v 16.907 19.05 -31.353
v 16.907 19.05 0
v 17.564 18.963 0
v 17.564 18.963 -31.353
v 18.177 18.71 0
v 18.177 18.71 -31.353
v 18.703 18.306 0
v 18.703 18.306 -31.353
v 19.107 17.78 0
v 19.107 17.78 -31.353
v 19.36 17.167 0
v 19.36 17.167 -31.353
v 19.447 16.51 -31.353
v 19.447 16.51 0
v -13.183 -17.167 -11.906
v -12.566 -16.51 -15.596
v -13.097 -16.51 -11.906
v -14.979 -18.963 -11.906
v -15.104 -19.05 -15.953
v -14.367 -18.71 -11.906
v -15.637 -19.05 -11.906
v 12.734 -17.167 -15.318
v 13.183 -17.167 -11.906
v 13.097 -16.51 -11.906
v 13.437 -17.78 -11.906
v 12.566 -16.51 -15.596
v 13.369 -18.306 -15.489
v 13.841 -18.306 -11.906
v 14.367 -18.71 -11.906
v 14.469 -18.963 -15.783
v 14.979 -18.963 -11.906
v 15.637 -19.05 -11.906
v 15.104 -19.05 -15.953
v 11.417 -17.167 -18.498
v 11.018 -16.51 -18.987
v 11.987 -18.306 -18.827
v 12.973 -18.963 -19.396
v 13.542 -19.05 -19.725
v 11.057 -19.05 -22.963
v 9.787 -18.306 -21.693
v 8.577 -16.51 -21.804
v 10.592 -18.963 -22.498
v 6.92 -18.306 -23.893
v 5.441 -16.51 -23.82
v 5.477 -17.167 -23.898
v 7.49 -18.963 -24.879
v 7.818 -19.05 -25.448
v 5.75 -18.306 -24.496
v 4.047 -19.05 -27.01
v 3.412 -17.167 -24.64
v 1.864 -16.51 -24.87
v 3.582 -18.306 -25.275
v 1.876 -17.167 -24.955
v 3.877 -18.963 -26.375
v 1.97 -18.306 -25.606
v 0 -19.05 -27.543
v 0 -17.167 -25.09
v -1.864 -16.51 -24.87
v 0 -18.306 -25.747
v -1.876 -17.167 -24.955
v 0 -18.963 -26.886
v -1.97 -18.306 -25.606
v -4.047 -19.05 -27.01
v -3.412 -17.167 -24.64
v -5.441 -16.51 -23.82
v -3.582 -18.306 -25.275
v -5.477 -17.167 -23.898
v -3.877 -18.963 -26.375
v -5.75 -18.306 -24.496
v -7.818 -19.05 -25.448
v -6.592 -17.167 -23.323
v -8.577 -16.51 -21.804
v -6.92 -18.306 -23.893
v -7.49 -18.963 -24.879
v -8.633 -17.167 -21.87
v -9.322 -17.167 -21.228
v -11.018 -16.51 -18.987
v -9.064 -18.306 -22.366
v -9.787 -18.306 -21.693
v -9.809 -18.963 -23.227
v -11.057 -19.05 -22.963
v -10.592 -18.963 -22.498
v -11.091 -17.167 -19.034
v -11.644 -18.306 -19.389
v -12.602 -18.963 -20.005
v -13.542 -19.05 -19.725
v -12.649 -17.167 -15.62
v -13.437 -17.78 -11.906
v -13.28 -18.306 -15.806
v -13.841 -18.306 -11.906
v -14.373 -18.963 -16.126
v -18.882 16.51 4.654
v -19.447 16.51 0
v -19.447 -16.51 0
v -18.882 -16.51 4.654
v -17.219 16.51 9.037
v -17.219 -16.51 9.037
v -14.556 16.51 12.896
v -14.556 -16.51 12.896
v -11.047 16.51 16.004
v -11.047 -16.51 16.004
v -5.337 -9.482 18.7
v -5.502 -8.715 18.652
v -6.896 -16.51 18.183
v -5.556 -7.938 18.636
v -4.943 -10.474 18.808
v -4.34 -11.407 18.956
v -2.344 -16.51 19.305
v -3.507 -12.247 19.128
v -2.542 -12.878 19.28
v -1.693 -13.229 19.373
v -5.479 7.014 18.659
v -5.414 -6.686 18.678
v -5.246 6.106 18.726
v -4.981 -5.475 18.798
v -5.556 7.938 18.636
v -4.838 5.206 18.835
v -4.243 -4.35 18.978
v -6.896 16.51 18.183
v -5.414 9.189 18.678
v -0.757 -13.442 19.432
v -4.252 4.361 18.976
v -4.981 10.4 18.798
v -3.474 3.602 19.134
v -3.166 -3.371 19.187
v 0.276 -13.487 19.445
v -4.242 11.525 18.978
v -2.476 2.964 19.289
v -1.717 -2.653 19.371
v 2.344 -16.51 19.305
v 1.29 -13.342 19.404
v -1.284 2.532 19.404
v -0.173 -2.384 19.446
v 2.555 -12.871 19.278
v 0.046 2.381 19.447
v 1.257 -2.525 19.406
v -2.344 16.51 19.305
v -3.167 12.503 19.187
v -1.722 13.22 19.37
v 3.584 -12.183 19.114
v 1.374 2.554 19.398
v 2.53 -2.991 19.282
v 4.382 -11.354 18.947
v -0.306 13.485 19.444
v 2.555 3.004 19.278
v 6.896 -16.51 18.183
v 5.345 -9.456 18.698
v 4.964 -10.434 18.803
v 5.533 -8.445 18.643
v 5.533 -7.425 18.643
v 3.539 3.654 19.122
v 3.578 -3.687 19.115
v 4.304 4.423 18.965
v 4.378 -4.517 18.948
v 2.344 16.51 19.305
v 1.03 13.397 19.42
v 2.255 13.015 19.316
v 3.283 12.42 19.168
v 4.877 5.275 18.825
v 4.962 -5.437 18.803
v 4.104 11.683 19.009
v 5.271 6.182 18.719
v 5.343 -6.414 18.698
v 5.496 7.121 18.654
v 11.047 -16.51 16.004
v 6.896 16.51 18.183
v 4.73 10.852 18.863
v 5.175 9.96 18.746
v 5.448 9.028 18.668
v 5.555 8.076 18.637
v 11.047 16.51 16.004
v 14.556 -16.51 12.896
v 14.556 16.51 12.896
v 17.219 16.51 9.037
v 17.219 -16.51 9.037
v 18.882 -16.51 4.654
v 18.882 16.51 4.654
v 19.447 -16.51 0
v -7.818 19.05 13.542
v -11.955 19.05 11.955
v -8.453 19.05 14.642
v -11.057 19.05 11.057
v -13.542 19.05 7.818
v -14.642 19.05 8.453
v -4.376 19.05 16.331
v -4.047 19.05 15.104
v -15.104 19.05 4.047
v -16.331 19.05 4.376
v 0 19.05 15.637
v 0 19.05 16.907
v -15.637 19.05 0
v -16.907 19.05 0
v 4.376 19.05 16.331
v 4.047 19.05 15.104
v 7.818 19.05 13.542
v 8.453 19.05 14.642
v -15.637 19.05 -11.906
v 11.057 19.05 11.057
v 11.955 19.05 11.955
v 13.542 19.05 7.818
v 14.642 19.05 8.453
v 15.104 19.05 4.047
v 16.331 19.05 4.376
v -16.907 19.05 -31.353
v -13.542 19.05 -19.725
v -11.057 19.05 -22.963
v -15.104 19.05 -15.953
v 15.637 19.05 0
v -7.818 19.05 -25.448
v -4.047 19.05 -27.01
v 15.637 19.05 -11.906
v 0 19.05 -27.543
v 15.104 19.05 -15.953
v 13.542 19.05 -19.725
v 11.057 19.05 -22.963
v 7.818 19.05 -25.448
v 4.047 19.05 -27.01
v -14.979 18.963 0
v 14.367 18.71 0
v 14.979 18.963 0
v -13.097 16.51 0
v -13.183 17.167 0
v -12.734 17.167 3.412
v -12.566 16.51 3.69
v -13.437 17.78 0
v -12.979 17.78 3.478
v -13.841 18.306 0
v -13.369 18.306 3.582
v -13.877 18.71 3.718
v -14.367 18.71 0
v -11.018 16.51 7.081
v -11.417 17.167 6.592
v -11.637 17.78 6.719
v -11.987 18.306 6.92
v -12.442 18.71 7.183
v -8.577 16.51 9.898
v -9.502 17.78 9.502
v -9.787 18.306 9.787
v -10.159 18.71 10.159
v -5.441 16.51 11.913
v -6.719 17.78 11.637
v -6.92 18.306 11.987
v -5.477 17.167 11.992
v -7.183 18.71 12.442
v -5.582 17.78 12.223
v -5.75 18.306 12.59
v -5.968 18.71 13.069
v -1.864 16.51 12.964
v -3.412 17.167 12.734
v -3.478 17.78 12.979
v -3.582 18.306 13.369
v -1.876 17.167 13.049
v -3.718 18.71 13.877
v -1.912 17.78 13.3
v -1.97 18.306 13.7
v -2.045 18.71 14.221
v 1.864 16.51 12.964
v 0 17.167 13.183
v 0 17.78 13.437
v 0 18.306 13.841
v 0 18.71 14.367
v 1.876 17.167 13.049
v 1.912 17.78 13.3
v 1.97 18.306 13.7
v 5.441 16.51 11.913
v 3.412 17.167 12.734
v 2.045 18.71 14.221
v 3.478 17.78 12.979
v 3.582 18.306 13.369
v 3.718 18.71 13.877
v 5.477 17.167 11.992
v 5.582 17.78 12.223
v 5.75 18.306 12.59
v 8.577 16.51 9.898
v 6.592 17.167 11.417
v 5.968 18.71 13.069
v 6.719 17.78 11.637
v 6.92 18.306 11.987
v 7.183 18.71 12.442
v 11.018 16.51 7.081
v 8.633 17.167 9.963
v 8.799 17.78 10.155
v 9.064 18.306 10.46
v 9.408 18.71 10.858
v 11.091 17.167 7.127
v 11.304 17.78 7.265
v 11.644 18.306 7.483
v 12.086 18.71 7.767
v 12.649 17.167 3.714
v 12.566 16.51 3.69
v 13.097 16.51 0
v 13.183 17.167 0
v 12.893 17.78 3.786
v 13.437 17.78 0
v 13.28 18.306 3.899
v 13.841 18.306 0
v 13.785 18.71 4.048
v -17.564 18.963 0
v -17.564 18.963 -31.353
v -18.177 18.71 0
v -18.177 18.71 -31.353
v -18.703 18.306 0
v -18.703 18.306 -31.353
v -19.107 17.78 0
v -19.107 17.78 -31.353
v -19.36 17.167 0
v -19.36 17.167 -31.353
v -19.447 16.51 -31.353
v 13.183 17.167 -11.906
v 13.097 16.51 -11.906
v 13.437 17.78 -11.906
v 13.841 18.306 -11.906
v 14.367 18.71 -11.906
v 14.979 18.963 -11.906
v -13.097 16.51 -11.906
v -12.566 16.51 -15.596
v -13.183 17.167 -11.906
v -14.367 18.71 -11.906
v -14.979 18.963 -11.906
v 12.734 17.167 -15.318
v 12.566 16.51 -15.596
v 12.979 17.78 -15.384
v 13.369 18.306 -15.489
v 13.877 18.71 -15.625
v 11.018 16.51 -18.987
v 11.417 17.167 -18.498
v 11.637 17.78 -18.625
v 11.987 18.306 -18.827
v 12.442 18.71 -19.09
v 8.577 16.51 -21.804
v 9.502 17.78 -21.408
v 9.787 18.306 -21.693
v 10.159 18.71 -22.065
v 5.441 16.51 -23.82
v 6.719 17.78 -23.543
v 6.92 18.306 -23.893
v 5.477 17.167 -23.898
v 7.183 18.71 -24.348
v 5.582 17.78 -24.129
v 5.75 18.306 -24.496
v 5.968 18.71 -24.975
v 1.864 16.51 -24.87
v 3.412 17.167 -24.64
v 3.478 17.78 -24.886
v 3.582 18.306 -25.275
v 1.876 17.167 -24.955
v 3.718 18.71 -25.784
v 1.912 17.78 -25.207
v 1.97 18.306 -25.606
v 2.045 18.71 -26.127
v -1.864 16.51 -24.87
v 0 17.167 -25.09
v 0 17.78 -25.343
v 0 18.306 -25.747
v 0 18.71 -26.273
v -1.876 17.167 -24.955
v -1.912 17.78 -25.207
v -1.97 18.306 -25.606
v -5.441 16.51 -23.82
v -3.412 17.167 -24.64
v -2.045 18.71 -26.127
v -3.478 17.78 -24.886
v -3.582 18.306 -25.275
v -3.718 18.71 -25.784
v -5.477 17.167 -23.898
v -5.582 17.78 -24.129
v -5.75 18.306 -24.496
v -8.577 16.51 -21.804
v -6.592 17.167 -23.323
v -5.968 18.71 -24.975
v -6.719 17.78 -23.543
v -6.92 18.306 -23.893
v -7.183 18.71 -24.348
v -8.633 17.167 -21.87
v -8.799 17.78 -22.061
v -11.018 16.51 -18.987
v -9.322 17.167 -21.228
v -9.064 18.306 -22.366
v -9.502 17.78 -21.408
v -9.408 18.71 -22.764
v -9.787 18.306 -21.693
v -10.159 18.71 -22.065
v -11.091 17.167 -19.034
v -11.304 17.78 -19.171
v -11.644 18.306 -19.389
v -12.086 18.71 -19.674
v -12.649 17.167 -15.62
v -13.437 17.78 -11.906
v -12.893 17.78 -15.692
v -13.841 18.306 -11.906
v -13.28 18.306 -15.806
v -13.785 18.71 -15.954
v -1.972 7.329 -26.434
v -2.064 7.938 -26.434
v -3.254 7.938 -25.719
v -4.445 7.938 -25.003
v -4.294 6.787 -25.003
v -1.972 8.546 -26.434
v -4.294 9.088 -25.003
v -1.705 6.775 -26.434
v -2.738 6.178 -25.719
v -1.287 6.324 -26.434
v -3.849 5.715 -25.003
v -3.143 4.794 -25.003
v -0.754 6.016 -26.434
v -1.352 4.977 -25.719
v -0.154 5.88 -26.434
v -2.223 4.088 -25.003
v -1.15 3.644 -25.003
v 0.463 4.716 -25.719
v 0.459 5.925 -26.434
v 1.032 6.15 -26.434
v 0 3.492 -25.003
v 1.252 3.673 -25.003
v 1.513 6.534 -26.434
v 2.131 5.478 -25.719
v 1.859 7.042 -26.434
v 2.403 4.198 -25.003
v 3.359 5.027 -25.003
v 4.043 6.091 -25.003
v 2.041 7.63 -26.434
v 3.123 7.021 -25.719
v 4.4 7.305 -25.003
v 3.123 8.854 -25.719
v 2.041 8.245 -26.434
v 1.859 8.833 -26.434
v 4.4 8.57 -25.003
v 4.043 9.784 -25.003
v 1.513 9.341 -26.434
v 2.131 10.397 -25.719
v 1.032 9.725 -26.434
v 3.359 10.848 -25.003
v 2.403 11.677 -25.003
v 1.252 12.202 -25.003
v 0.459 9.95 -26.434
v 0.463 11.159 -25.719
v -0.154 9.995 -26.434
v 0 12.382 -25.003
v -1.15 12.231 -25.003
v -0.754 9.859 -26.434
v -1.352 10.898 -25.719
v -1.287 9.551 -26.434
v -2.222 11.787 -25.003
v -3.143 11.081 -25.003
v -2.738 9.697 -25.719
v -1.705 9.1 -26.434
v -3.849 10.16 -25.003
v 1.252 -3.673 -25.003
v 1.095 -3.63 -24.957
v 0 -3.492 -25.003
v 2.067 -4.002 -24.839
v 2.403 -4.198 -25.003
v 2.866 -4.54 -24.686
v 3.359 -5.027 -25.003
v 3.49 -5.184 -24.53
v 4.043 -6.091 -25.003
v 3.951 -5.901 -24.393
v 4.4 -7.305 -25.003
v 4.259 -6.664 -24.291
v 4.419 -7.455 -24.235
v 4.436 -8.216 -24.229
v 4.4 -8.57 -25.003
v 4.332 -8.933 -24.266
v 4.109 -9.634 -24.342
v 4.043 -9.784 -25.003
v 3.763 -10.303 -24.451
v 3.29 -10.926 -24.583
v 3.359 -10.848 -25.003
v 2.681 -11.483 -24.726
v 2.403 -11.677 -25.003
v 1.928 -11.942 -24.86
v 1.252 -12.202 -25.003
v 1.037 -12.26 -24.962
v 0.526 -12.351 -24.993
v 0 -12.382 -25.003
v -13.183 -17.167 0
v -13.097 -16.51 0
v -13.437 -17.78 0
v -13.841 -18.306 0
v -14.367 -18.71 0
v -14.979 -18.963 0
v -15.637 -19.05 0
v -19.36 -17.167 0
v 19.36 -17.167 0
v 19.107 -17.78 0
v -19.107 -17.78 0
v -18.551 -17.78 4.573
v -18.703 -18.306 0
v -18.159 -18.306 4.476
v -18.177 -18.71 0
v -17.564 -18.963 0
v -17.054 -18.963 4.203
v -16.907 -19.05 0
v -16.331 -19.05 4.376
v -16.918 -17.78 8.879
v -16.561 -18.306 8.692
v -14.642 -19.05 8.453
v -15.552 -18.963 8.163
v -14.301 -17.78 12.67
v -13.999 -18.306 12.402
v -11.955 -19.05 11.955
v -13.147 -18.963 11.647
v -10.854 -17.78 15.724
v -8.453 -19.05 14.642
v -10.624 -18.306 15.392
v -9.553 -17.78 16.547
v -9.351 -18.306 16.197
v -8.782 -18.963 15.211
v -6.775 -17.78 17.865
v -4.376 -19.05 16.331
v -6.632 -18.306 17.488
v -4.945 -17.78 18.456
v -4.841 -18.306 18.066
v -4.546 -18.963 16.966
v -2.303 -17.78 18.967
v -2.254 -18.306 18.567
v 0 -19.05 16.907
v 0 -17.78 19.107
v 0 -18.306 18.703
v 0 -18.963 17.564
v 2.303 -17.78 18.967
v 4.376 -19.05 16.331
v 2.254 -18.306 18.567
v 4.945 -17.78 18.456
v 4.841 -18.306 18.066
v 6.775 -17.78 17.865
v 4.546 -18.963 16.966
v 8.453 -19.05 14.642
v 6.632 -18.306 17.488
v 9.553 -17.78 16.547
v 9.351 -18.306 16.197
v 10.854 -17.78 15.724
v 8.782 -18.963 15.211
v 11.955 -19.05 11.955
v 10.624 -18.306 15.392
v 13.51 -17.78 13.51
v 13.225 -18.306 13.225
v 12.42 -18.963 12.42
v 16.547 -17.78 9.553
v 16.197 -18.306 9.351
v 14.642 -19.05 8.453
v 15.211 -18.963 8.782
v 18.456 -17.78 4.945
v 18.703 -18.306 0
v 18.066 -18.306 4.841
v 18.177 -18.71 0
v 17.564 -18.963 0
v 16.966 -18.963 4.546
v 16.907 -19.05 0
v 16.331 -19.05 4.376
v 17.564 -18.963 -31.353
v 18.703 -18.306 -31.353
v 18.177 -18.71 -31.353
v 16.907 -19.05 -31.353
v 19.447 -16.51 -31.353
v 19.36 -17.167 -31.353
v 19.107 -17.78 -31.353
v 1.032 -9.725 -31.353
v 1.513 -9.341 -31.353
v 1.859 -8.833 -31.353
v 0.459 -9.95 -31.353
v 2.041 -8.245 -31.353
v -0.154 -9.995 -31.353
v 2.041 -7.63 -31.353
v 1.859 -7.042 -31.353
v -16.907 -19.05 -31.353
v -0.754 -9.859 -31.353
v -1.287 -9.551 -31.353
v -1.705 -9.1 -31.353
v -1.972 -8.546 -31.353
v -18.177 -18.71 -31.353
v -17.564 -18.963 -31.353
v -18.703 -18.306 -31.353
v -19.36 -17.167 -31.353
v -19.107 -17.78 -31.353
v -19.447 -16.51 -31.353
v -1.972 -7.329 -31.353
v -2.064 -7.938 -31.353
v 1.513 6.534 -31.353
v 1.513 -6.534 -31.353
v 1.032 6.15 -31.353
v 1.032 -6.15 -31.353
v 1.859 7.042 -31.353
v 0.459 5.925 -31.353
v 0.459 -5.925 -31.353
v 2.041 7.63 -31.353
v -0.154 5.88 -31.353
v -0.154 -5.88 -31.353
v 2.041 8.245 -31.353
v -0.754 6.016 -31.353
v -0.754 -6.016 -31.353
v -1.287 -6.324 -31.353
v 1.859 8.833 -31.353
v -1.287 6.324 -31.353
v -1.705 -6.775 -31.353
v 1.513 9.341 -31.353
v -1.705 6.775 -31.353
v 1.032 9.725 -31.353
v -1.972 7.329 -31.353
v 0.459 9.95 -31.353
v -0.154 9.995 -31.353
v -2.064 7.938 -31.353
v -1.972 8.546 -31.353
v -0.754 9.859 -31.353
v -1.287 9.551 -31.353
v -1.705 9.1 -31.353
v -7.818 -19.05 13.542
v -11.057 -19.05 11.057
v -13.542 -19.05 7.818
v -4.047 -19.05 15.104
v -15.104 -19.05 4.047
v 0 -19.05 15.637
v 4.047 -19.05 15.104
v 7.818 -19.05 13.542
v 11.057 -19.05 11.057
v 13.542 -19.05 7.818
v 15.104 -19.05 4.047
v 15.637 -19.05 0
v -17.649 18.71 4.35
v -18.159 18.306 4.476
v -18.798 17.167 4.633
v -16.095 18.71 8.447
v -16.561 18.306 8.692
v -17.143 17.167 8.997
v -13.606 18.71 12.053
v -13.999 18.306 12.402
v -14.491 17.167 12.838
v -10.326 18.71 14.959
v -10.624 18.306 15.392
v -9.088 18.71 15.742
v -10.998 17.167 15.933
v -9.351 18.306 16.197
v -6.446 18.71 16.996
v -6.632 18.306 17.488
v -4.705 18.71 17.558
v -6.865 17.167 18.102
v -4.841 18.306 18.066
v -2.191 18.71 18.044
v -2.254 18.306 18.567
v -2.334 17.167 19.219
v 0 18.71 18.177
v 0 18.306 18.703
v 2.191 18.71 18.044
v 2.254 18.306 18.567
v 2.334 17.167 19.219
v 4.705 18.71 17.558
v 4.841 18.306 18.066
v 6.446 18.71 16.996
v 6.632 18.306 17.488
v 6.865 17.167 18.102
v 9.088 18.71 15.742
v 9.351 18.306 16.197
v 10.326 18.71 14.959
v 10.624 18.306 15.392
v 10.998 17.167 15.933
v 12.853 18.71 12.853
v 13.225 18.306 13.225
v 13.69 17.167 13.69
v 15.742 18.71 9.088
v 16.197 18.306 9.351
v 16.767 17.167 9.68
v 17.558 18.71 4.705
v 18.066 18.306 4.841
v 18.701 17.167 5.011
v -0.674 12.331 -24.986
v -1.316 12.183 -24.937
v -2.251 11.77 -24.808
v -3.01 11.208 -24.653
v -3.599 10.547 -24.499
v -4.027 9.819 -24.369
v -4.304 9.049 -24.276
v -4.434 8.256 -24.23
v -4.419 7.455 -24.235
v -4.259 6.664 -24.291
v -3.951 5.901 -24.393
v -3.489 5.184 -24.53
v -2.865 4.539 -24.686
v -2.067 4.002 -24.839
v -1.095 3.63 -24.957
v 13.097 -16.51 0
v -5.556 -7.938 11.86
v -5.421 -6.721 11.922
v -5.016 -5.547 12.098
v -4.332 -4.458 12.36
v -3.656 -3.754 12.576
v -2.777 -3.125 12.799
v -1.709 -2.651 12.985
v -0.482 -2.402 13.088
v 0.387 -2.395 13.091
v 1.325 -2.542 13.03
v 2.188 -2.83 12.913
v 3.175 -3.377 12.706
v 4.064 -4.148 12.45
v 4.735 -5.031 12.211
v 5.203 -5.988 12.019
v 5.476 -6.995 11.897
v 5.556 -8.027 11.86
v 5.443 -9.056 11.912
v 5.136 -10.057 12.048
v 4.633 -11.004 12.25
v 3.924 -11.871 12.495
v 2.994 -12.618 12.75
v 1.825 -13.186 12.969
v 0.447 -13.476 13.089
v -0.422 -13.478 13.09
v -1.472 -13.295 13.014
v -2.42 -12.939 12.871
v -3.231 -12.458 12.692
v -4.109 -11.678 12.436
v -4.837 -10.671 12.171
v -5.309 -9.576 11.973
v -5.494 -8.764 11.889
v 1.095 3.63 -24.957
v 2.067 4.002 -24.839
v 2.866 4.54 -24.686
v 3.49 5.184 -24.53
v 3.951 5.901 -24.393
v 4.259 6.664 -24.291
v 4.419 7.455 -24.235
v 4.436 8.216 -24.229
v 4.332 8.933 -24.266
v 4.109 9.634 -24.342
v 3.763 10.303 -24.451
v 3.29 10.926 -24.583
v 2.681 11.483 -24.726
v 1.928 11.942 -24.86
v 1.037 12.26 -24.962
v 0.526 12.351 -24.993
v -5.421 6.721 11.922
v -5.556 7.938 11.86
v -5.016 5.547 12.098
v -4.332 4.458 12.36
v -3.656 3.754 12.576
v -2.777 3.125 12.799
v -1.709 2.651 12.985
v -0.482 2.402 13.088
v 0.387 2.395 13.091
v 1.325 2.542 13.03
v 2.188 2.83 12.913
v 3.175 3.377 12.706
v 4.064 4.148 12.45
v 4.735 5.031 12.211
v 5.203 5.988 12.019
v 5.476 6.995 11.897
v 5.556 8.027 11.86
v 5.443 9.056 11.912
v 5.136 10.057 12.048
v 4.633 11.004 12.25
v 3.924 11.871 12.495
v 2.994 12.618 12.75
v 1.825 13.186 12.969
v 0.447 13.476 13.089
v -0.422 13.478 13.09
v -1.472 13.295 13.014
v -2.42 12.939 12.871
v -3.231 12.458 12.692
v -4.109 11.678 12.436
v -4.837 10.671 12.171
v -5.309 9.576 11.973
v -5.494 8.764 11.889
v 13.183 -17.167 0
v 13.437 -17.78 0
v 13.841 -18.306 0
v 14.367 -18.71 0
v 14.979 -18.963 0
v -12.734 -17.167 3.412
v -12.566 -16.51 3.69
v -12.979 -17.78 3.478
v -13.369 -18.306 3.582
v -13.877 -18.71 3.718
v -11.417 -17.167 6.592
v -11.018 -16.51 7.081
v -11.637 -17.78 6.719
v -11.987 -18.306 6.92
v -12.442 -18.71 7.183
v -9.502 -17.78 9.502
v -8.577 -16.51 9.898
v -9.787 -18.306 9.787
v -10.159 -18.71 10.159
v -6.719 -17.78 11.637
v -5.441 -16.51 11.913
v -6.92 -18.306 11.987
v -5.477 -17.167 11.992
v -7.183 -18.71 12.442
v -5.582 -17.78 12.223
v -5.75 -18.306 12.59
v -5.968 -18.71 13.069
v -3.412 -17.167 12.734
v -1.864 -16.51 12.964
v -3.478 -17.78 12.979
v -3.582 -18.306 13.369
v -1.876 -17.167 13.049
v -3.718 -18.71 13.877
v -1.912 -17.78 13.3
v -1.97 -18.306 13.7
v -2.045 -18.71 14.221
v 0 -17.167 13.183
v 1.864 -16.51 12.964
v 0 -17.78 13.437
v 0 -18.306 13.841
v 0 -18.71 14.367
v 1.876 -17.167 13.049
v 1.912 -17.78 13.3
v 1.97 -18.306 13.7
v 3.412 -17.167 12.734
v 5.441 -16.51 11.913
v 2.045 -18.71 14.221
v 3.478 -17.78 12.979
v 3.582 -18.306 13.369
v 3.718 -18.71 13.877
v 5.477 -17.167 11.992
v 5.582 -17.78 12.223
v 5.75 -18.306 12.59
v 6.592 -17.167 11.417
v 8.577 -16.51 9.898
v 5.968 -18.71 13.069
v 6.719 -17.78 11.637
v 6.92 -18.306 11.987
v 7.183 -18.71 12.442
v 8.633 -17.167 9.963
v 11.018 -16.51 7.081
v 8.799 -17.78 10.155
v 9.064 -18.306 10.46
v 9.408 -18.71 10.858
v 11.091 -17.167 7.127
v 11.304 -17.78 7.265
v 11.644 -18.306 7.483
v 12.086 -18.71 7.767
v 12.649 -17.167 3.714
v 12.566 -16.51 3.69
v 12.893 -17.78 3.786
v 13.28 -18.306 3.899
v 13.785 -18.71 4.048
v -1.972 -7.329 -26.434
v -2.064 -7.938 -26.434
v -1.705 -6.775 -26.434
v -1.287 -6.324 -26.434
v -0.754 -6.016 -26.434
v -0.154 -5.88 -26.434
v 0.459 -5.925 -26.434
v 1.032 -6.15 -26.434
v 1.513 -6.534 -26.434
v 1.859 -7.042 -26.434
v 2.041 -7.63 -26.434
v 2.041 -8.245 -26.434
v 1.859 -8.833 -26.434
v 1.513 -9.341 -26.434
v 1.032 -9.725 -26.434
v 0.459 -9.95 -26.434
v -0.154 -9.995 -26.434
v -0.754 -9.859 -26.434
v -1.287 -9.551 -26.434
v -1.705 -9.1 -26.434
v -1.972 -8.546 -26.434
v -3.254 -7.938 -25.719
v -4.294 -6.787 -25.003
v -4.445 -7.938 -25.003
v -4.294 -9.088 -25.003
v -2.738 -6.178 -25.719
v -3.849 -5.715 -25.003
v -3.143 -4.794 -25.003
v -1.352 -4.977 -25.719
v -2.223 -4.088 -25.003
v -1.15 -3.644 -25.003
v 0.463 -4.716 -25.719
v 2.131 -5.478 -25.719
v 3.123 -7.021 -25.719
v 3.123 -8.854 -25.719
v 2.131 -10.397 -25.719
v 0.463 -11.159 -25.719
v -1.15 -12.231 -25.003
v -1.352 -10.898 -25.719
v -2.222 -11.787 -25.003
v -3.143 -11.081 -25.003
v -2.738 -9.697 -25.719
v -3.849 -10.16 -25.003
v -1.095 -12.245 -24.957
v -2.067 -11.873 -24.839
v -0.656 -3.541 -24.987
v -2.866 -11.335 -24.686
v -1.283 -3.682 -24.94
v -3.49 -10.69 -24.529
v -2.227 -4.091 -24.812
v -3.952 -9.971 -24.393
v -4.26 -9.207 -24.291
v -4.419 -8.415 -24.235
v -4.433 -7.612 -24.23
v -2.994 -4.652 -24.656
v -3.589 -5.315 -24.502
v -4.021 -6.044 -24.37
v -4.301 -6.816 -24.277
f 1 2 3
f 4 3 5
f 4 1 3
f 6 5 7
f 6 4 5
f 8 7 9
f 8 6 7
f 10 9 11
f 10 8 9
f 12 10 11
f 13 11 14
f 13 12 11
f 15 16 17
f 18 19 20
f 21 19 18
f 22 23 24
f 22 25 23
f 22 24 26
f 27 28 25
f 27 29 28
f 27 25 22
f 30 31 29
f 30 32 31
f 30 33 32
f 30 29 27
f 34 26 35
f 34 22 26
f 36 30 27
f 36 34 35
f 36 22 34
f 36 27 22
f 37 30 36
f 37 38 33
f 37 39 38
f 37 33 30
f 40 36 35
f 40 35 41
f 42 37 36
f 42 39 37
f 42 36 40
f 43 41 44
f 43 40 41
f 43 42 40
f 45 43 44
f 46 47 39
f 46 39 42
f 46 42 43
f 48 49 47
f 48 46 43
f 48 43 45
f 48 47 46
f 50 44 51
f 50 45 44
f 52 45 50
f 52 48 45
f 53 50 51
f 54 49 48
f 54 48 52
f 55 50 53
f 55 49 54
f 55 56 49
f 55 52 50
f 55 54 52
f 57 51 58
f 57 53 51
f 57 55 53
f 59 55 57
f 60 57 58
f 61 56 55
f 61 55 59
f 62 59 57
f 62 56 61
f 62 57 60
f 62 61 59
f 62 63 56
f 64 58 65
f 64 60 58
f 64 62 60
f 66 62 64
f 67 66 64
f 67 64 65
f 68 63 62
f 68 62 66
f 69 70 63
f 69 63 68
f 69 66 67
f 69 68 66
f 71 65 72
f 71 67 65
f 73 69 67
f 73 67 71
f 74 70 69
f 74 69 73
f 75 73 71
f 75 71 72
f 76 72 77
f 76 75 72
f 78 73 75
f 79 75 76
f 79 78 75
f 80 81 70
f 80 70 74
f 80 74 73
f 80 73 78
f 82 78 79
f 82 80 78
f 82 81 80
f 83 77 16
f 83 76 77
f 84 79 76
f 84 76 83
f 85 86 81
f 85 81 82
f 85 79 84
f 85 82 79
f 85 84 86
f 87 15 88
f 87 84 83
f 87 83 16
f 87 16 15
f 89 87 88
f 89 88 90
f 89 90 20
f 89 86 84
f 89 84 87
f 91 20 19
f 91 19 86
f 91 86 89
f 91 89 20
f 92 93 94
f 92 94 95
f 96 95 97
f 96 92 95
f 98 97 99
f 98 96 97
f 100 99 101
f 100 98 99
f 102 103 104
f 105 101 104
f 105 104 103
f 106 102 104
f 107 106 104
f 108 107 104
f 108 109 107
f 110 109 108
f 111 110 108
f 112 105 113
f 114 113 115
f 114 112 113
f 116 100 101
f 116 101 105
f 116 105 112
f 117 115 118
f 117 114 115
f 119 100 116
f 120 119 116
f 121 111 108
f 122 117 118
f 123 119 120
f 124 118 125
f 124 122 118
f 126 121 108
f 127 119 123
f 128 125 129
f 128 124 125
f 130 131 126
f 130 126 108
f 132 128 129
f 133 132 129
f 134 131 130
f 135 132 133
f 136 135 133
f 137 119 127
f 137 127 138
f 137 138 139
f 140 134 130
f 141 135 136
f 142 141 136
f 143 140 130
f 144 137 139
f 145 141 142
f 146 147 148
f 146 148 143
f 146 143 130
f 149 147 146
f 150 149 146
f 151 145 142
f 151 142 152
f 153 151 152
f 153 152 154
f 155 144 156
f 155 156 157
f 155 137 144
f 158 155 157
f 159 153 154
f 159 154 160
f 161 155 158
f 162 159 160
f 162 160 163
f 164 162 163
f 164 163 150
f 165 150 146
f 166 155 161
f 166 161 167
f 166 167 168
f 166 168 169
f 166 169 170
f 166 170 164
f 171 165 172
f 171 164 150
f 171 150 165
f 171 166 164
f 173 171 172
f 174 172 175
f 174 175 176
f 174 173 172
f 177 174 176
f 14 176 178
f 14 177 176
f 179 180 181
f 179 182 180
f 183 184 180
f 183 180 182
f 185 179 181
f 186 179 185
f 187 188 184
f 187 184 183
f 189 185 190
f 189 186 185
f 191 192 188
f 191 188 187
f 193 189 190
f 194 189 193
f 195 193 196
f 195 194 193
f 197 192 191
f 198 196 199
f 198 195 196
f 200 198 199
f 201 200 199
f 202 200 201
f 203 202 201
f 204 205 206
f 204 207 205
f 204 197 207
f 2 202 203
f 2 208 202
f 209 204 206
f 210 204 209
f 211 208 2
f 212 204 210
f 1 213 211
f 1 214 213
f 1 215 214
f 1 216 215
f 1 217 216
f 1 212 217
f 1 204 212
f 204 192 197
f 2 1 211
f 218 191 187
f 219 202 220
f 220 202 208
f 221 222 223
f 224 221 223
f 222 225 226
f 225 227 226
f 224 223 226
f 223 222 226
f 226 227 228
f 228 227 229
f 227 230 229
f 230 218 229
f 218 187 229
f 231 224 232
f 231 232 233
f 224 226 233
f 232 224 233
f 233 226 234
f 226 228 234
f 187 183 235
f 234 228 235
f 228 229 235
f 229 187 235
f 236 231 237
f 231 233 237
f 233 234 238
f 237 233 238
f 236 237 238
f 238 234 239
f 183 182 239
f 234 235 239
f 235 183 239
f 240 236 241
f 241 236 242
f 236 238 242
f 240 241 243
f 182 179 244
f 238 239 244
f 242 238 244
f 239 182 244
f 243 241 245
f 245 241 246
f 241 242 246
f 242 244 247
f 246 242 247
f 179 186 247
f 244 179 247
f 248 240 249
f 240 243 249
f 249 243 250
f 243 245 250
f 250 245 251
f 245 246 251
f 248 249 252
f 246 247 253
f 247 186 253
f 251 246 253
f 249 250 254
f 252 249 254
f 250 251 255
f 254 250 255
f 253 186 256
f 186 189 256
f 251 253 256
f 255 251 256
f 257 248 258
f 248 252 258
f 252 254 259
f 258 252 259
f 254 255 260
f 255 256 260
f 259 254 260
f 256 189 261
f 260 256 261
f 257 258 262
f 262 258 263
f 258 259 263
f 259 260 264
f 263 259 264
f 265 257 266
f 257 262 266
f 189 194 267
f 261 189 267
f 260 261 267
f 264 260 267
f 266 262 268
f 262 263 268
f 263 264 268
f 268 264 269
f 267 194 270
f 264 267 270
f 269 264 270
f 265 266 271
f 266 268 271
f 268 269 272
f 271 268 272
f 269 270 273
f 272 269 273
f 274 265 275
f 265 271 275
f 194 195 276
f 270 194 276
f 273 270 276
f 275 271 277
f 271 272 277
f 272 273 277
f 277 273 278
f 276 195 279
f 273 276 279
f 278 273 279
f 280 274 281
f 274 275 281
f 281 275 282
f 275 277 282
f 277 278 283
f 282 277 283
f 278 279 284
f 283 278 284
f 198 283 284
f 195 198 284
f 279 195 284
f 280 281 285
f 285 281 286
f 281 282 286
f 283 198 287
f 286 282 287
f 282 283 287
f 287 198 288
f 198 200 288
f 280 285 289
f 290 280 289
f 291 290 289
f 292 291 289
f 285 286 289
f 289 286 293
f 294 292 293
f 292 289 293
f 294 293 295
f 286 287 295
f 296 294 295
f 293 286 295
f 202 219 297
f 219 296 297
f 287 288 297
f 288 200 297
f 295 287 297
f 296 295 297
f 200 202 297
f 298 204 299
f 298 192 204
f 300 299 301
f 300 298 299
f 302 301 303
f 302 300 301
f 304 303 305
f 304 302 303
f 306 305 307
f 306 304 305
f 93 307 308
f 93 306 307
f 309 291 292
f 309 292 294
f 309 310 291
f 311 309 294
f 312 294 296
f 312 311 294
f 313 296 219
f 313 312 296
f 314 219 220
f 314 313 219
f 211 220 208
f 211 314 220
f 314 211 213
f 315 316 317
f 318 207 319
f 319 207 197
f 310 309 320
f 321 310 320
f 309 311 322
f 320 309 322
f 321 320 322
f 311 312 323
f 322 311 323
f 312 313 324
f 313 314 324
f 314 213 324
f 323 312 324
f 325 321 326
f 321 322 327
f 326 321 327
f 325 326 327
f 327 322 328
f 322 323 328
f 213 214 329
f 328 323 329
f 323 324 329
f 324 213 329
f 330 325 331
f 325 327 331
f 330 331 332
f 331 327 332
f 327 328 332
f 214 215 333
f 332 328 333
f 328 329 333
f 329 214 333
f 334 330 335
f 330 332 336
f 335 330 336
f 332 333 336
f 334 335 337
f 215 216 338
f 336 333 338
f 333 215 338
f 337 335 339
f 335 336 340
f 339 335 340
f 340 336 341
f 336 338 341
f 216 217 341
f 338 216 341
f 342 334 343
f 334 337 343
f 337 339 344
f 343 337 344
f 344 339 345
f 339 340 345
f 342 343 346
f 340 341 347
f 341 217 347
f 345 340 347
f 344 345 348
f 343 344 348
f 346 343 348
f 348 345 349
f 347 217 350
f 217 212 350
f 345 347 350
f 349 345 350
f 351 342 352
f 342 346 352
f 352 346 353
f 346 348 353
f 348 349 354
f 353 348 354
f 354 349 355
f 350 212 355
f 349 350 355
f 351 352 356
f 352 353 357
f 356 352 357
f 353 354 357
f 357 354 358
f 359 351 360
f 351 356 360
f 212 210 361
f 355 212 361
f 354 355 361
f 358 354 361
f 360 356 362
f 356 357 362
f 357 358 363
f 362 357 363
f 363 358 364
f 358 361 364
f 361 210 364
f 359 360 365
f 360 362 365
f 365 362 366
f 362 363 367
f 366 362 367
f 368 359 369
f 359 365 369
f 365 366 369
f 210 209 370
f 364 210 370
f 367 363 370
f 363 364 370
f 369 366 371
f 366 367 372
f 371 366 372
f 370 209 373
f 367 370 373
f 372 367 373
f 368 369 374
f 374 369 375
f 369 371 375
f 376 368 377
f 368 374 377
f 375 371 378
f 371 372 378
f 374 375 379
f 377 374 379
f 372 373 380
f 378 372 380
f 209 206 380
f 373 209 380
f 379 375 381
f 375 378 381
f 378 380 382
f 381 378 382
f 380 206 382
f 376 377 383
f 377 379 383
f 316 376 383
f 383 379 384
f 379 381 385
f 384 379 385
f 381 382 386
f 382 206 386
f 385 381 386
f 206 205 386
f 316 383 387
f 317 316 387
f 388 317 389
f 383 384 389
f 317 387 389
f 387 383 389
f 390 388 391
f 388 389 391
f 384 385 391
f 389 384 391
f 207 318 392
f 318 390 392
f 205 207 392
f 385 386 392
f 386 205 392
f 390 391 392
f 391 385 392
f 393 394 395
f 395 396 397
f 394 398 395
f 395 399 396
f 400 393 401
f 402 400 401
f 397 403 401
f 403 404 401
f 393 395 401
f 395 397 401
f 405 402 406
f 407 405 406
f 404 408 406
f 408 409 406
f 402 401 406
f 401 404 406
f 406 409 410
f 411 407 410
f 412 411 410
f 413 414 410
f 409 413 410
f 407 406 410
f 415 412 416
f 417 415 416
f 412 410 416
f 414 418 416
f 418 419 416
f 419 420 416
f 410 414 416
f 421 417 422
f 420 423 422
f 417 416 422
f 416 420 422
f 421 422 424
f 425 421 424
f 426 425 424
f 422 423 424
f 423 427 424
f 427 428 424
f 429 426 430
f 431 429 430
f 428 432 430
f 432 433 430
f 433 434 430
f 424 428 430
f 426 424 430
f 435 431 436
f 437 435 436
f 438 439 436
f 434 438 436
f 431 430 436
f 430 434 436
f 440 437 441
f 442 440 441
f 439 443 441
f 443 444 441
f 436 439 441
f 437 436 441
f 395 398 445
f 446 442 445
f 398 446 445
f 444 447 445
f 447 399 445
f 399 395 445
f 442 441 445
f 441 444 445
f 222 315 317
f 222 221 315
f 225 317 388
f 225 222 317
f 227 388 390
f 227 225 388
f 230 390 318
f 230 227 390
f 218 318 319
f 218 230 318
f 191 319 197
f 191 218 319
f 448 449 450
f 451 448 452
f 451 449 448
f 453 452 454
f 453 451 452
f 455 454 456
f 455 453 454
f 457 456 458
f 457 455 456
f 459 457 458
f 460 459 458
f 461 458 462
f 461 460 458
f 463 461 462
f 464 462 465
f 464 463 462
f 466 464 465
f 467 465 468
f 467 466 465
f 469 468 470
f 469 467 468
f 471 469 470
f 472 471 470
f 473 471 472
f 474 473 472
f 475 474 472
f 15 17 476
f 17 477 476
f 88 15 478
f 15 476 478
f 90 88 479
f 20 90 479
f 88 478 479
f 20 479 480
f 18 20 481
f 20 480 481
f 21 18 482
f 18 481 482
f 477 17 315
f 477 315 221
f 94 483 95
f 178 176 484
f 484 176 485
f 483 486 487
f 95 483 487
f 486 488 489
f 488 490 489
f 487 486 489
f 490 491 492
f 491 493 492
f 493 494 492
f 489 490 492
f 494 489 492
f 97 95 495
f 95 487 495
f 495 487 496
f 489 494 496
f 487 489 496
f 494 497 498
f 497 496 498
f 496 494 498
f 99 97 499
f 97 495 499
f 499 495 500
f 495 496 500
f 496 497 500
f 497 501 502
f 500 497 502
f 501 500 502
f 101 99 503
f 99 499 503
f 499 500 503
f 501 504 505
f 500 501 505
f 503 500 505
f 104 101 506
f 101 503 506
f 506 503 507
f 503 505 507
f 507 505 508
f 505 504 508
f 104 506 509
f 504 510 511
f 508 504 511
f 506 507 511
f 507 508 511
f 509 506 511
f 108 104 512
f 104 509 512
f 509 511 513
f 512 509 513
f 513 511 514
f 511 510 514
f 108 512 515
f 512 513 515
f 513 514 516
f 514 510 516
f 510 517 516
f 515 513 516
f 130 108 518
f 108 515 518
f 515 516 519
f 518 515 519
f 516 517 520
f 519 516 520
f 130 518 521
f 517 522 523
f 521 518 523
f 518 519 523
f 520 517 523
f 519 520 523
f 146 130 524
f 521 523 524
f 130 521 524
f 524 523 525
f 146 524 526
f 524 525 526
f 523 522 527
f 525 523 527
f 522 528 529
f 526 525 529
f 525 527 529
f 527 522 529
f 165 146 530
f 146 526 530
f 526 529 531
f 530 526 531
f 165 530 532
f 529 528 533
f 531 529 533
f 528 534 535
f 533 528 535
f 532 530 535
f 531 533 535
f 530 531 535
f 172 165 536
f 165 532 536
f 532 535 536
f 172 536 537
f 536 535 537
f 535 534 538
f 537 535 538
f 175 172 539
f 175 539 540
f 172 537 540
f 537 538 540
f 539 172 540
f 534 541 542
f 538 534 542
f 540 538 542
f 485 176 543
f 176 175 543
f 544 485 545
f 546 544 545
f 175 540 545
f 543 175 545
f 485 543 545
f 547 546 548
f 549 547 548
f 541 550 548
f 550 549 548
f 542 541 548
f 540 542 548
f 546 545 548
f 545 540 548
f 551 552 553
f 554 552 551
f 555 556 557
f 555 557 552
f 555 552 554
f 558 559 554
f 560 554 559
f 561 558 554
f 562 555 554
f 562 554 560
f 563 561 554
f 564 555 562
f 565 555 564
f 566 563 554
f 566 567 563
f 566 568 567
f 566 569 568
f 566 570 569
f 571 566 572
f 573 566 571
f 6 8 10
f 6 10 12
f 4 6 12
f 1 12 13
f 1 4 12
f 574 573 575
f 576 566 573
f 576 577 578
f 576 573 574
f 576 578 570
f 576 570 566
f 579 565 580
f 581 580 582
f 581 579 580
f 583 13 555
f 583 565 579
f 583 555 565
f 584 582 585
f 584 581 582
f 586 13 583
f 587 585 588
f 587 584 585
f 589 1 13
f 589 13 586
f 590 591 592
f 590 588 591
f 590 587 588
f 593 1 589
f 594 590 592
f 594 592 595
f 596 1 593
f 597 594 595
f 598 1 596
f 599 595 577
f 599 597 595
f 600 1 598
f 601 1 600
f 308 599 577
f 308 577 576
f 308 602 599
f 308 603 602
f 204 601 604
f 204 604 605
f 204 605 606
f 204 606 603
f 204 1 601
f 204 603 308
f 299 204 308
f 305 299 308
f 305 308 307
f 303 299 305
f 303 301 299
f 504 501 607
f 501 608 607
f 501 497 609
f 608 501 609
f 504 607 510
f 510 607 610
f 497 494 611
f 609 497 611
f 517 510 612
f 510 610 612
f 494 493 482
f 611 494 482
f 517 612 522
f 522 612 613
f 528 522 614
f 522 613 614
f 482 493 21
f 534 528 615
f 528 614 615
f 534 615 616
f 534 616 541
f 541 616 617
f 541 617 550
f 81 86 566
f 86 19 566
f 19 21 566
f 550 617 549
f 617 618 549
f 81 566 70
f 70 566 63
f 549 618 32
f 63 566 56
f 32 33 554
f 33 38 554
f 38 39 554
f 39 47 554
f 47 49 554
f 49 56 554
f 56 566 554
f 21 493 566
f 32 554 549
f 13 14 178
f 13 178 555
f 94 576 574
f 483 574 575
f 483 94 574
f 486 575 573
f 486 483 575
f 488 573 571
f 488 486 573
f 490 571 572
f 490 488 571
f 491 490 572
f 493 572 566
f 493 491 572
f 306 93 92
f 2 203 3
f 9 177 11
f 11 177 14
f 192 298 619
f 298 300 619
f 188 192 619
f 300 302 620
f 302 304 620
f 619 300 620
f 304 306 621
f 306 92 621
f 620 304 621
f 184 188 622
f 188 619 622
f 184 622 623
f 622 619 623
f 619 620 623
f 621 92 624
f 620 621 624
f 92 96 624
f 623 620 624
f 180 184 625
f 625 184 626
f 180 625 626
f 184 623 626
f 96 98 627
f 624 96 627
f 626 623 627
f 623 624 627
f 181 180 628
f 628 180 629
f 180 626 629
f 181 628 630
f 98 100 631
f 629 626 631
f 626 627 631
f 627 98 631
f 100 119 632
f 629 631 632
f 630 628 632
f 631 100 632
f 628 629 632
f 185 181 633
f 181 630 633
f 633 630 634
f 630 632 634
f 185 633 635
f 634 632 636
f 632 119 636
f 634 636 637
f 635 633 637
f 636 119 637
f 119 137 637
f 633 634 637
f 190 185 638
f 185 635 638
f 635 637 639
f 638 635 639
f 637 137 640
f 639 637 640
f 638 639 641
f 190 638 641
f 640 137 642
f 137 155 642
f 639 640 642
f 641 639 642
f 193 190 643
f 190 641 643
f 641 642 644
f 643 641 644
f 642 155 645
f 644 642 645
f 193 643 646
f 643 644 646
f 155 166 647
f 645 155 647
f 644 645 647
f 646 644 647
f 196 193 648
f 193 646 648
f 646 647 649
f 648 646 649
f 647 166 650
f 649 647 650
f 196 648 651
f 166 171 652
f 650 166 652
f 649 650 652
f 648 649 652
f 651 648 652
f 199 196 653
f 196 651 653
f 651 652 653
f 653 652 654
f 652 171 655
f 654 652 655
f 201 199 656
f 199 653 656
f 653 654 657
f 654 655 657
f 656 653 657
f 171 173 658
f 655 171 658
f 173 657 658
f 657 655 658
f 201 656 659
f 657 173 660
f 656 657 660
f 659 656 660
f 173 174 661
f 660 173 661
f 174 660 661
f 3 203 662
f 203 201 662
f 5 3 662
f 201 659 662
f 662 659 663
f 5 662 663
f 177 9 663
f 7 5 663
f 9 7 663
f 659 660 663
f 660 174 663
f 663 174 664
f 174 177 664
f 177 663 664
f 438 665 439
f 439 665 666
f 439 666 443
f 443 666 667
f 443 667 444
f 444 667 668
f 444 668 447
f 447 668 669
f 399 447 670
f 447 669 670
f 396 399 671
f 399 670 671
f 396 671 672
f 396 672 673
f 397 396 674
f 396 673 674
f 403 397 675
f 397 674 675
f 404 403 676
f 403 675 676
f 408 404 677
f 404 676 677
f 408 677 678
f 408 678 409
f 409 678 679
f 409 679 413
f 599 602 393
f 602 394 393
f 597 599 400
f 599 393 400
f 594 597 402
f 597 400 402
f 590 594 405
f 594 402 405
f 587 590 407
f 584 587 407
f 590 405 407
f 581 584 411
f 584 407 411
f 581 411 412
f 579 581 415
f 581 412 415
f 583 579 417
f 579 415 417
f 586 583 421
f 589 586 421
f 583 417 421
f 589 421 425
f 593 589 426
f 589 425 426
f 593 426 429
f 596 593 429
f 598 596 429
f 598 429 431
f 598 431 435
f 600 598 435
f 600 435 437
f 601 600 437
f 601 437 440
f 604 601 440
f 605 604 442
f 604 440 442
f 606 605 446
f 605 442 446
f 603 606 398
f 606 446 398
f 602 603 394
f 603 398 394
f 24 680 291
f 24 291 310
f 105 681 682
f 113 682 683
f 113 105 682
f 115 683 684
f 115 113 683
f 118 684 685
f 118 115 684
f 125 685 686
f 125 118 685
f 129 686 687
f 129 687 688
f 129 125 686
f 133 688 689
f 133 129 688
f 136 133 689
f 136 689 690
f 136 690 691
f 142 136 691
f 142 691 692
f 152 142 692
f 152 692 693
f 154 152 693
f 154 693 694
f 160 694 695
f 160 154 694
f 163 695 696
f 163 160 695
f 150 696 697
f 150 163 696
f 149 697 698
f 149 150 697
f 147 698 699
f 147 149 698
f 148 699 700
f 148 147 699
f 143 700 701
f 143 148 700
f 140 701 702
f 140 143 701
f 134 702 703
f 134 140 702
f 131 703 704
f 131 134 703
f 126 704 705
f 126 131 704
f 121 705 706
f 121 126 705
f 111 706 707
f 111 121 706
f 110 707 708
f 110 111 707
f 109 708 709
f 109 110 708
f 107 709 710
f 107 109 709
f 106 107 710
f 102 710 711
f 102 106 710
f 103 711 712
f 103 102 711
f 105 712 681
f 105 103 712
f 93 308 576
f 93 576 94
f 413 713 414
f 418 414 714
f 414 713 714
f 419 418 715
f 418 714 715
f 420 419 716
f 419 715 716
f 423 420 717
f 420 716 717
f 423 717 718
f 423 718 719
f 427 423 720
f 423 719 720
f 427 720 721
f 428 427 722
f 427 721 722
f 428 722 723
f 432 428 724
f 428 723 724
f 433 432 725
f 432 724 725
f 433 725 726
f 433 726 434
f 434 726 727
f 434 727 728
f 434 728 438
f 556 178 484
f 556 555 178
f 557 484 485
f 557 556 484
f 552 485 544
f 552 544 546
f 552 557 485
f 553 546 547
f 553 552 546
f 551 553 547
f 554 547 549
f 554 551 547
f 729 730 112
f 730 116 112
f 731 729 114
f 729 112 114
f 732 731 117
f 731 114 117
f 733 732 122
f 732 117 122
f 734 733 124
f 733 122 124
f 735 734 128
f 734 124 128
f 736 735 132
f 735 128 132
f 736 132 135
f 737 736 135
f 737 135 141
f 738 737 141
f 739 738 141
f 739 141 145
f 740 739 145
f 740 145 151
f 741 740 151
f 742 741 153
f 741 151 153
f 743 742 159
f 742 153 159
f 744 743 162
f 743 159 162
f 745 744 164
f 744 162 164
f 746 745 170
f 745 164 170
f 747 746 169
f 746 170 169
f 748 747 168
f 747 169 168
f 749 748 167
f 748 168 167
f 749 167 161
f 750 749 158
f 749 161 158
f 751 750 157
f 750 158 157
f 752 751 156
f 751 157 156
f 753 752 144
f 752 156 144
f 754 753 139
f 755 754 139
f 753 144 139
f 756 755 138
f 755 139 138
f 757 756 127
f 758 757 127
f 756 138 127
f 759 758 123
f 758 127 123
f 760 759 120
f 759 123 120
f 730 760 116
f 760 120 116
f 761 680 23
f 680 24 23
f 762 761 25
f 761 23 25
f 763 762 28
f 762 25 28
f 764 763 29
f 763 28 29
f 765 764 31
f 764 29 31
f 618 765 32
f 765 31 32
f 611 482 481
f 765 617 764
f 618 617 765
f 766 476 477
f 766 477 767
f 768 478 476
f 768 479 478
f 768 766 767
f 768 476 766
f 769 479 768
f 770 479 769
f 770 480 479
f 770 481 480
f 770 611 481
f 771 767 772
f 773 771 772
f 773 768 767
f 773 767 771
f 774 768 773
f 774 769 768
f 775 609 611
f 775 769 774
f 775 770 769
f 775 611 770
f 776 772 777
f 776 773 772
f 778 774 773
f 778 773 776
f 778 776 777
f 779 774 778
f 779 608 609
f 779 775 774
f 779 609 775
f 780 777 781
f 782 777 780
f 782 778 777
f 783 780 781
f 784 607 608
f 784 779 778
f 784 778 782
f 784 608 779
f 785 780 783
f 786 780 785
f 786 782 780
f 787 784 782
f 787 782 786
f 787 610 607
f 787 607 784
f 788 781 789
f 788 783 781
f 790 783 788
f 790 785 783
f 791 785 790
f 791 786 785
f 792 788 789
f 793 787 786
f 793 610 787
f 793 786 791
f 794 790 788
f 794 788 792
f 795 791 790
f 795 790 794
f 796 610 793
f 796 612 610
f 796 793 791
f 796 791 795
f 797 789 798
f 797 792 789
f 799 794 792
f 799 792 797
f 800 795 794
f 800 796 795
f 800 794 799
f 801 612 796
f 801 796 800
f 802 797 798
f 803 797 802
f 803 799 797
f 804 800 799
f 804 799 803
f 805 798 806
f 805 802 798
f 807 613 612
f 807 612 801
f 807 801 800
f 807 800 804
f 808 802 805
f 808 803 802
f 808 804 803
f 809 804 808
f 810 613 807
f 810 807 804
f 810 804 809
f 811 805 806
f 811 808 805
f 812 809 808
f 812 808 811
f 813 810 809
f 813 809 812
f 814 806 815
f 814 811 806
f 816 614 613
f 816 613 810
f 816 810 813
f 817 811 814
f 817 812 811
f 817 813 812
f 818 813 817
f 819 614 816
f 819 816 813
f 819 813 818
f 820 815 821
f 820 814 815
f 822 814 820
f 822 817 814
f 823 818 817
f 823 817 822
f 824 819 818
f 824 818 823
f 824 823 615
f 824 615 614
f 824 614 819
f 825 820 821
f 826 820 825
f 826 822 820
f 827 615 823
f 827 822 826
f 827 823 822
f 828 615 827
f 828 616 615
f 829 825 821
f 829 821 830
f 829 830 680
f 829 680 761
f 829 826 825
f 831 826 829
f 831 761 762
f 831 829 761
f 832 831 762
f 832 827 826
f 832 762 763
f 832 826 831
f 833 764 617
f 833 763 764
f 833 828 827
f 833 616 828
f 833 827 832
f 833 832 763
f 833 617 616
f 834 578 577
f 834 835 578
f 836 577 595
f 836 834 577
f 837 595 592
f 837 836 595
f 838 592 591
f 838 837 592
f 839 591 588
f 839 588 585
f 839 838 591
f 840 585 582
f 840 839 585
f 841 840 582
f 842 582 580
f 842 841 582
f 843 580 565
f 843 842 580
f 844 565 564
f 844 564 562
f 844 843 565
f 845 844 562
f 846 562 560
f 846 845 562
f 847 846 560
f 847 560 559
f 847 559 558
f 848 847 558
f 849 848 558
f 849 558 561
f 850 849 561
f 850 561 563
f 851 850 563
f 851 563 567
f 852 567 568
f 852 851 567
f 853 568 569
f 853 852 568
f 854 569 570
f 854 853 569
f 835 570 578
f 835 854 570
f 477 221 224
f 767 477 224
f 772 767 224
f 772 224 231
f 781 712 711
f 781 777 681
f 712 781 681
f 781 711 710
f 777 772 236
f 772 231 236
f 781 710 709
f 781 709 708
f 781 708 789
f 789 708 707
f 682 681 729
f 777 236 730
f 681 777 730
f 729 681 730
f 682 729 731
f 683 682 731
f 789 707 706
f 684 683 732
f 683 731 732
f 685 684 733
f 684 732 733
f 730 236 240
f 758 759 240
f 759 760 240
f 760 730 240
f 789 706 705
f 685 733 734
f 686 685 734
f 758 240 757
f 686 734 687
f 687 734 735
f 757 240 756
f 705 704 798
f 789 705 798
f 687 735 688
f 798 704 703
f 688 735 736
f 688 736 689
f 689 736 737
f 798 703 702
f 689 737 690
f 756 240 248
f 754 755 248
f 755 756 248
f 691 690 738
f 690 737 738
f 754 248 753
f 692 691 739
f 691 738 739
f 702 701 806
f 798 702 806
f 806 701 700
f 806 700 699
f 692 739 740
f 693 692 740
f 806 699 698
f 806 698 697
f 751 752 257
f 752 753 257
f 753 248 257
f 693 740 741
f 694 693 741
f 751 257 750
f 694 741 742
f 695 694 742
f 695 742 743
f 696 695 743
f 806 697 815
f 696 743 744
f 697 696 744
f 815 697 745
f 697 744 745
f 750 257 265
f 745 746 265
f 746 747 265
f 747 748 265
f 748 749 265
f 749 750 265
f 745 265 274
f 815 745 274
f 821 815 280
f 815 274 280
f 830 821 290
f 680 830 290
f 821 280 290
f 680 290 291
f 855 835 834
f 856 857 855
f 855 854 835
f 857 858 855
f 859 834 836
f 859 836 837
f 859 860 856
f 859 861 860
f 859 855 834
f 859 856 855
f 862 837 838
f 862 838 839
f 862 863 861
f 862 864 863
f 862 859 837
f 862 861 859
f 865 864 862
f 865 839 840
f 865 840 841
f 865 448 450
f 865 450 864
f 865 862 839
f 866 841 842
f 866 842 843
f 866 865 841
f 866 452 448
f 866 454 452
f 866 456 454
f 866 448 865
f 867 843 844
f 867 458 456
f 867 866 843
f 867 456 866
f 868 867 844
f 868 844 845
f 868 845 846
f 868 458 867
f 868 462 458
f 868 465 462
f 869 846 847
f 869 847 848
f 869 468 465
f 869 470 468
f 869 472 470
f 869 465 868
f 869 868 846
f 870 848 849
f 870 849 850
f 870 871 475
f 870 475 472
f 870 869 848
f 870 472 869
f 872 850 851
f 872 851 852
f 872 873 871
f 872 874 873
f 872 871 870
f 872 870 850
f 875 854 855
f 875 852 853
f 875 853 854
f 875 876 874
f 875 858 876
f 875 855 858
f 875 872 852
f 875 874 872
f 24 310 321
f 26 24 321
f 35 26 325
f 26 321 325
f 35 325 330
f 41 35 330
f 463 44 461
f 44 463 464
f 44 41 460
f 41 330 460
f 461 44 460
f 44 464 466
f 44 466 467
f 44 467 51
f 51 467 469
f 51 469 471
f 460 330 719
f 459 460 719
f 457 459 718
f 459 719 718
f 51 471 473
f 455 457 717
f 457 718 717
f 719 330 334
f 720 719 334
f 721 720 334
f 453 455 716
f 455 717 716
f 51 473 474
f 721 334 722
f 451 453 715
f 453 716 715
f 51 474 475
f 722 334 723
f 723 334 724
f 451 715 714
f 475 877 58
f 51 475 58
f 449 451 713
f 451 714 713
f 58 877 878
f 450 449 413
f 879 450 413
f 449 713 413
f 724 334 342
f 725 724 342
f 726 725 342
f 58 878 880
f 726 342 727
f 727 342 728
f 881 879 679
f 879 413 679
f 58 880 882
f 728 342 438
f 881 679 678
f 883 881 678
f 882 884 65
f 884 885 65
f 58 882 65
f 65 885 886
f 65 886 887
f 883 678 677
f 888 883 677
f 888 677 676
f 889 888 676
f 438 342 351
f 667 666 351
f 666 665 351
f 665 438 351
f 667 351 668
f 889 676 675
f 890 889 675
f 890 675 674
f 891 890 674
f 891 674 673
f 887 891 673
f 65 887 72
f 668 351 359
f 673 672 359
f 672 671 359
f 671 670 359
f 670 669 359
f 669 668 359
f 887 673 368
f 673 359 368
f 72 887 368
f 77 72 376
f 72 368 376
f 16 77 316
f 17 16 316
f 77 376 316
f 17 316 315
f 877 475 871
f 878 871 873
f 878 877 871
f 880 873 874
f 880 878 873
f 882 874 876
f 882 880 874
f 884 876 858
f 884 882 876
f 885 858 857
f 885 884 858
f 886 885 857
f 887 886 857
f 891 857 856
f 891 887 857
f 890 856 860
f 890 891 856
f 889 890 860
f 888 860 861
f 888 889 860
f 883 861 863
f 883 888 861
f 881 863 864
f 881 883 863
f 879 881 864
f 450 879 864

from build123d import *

# Parameters (mm, degrees)
BOSS_EXTRUDE1_DEPTH = 19.05
FILLET1_R           = 2.54


with BuildPart() as part:
    # Sketch1 → Boss-Extrude1 (new, symmetric)
    with BuildSketch(Plane(origin=(0, 0, 0), x_dir=(1, 0, 0), z_dir=(0, 1, 0))):
        with BuildLine():
            ThreePointArc((-19.446875, 0), (0, -19.446875), (19.446875, 0))
            Line((19.446875, 0), (19.446875, 31.353125))
            Line((19.446875, 31.353125), (-19.446875, 31.353125))
            Line((-19.446875, 31.353125), (-19.446875, 0))
        make_face()
        with BuildLine():
            ThreePointArc((13.096875, 0), (0, -13.096875), (-13.096875, 0))
            Line((-13.096875, 0), (-13.096875, 11.90625))
            ThreePointArc((-13.096875, 11.90625), (0, 25.003125), (13.096875, 11.90625))
            Line((13.096875, 11.90625), (13.096875, 0))
        make_face(mode=Mode.SUBTRACT)
    extrude(amount=BOSS_EXTRUDE1_DEPTH, both=True)

    # Sketch2 → Cut-Revolve1 (revolve, cut)
    with BuildSketch(Plane(origin=(0, 7.9375, 0), x_dir=(1, 0, 0), z_dir=(0, 1, 0))):
        Polygon((-2.06375, 31.353125), (-2.06375, 26.433924349), (-4.445, 25.003125), (-4.445, 0), (-5.55625, 0), (-5.55625, -19.446875), (-4.445, -19.446875), (0, -19.446875), (0, 31.353125), align=None)
    cut_revolve1 = revolve(axis=Axis((0, 7.9375, -28.179060189), (0, 0, 1)), mode=Mode.SUBTRACT)

    # Mirror1: Cut-Revolve1 across plane
    add(cut_revolve1.mirror(Plane.ZX), mode=Mode.SUBTRACT)

    # Fillet1
    fillet1_edges = [part.edges().sort_by_distance(p)[0] for p in [
        (19.446875, -19.05, -15.6765625),
        (0, -19.05, 19.446875),
        (13.096875, -19.05, -5.953125),
        (0, -19.05, 13.096875),
        (-13.096875, -19.05, -5.953125),
        (13.096875, 19.05, -5.953125),
        (0, 19.05, 13.096875),
        (-13.096875, 19.05, -5.953125),
        (19.446875, 19.05, -15.6765625),
        (0, 19.05, 19.446875),
        (-19.446875, -19.05, -15.6765625),
        (0, -19.05, -25.003125),
        (0, 19.05, -25.003125),
        (-19.446875, 19.05, -15.6765625),
    ]]
    fillet(fillet1_edges, radius=FILLET1_R)


solid = part.part
